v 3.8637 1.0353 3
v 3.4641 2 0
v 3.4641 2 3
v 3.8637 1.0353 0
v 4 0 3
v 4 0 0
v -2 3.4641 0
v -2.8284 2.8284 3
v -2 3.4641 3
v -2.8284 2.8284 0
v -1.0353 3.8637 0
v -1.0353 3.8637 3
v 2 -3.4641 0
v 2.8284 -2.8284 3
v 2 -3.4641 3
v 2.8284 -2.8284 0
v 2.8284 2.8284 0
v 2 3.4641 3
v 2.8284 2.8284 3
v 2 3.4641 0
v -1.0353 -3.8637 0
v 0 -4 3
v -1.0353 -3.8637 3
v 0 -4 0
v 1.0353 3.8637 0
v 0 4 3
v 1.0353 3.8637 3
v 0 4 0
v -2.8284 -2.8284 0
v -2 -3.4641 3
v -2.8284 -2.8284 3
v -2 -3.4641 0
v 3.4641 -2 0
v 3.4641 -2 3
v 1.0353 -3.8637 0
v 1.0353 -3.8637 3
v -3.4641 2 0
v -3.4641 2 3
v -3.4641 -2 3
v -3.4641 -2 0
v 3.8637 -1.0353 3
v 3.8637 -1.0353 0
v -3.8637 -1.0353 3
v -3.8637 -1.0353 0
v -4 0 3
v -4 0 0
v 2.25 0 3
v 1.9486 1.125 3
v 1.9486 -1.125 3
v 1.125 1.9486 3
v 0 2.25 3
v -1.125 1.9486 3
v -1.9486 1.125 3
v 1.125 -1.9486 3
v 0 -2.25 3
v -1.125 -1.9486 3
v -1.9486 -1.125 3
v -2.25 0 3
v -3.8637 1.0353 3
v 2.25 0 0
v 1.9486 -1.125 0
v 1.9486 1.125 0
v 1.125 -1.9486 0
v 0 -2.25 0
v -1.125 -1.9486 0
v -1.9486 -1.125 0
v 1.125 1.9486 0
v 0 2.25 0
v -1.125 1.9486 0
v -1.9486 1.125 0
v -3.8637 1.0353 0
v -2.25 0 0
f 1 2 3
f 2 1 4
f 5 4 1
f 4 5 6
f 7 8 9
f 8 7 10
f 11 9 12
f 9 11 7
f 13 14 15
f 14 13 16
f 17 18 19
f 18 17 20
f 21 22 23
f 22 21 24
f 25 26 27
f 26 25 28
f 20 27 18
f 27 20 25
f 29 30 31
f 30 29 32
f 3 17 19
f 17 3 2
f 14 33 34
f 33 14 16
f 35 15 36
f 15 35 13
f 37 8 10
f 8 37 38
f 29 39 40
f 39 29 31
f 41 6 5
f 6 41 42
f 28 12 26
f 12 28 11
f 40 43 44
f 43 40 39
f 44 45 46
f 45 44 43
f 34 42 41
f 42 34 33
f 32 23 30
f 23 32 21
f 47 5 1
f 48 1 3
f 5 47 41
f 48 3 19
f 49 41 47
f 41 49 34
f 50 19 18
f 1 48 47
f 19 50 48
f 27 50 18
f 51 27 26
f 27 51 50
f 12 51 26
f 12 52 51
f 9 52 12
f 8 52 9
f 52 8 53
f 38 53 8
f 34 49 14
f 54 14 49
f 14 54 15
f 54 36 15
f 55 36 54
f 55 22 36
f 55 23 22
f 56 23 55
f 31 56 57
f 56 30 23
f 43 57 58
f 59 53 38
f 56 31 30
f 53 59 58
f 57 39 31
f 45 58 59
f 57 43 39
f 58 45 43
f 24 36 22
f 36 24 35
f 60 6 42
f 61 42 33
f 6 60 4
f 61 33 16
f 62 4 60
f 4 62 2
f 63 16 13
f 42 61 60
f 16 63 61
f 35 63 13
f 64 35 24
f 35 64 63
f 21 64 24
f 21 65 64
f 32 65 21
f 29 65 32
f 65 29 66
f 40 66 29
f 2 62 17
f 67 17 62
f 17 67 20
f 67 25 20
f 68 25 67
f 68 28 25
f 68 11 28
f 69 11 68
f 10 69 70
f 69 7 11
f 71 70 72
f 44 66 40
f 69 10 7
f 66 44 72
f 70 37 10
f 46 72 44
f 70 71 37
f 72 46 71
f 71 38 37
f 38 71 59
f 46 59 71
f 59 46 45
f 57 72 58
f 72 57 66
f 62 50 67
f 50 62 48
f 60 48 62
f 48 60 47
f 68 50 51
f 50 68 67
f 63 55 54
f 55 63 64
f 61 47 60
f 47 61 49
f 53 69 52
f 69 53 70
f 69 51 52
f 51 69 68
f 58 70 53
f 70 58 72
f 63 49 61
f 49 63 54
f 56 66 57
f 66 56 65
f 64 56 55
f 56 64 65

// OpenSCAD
difference()
{
    cylinder(d=8,h=3,$fn=24);
    
    cylinder(d=4.5,h=3,$fn=12);
}
